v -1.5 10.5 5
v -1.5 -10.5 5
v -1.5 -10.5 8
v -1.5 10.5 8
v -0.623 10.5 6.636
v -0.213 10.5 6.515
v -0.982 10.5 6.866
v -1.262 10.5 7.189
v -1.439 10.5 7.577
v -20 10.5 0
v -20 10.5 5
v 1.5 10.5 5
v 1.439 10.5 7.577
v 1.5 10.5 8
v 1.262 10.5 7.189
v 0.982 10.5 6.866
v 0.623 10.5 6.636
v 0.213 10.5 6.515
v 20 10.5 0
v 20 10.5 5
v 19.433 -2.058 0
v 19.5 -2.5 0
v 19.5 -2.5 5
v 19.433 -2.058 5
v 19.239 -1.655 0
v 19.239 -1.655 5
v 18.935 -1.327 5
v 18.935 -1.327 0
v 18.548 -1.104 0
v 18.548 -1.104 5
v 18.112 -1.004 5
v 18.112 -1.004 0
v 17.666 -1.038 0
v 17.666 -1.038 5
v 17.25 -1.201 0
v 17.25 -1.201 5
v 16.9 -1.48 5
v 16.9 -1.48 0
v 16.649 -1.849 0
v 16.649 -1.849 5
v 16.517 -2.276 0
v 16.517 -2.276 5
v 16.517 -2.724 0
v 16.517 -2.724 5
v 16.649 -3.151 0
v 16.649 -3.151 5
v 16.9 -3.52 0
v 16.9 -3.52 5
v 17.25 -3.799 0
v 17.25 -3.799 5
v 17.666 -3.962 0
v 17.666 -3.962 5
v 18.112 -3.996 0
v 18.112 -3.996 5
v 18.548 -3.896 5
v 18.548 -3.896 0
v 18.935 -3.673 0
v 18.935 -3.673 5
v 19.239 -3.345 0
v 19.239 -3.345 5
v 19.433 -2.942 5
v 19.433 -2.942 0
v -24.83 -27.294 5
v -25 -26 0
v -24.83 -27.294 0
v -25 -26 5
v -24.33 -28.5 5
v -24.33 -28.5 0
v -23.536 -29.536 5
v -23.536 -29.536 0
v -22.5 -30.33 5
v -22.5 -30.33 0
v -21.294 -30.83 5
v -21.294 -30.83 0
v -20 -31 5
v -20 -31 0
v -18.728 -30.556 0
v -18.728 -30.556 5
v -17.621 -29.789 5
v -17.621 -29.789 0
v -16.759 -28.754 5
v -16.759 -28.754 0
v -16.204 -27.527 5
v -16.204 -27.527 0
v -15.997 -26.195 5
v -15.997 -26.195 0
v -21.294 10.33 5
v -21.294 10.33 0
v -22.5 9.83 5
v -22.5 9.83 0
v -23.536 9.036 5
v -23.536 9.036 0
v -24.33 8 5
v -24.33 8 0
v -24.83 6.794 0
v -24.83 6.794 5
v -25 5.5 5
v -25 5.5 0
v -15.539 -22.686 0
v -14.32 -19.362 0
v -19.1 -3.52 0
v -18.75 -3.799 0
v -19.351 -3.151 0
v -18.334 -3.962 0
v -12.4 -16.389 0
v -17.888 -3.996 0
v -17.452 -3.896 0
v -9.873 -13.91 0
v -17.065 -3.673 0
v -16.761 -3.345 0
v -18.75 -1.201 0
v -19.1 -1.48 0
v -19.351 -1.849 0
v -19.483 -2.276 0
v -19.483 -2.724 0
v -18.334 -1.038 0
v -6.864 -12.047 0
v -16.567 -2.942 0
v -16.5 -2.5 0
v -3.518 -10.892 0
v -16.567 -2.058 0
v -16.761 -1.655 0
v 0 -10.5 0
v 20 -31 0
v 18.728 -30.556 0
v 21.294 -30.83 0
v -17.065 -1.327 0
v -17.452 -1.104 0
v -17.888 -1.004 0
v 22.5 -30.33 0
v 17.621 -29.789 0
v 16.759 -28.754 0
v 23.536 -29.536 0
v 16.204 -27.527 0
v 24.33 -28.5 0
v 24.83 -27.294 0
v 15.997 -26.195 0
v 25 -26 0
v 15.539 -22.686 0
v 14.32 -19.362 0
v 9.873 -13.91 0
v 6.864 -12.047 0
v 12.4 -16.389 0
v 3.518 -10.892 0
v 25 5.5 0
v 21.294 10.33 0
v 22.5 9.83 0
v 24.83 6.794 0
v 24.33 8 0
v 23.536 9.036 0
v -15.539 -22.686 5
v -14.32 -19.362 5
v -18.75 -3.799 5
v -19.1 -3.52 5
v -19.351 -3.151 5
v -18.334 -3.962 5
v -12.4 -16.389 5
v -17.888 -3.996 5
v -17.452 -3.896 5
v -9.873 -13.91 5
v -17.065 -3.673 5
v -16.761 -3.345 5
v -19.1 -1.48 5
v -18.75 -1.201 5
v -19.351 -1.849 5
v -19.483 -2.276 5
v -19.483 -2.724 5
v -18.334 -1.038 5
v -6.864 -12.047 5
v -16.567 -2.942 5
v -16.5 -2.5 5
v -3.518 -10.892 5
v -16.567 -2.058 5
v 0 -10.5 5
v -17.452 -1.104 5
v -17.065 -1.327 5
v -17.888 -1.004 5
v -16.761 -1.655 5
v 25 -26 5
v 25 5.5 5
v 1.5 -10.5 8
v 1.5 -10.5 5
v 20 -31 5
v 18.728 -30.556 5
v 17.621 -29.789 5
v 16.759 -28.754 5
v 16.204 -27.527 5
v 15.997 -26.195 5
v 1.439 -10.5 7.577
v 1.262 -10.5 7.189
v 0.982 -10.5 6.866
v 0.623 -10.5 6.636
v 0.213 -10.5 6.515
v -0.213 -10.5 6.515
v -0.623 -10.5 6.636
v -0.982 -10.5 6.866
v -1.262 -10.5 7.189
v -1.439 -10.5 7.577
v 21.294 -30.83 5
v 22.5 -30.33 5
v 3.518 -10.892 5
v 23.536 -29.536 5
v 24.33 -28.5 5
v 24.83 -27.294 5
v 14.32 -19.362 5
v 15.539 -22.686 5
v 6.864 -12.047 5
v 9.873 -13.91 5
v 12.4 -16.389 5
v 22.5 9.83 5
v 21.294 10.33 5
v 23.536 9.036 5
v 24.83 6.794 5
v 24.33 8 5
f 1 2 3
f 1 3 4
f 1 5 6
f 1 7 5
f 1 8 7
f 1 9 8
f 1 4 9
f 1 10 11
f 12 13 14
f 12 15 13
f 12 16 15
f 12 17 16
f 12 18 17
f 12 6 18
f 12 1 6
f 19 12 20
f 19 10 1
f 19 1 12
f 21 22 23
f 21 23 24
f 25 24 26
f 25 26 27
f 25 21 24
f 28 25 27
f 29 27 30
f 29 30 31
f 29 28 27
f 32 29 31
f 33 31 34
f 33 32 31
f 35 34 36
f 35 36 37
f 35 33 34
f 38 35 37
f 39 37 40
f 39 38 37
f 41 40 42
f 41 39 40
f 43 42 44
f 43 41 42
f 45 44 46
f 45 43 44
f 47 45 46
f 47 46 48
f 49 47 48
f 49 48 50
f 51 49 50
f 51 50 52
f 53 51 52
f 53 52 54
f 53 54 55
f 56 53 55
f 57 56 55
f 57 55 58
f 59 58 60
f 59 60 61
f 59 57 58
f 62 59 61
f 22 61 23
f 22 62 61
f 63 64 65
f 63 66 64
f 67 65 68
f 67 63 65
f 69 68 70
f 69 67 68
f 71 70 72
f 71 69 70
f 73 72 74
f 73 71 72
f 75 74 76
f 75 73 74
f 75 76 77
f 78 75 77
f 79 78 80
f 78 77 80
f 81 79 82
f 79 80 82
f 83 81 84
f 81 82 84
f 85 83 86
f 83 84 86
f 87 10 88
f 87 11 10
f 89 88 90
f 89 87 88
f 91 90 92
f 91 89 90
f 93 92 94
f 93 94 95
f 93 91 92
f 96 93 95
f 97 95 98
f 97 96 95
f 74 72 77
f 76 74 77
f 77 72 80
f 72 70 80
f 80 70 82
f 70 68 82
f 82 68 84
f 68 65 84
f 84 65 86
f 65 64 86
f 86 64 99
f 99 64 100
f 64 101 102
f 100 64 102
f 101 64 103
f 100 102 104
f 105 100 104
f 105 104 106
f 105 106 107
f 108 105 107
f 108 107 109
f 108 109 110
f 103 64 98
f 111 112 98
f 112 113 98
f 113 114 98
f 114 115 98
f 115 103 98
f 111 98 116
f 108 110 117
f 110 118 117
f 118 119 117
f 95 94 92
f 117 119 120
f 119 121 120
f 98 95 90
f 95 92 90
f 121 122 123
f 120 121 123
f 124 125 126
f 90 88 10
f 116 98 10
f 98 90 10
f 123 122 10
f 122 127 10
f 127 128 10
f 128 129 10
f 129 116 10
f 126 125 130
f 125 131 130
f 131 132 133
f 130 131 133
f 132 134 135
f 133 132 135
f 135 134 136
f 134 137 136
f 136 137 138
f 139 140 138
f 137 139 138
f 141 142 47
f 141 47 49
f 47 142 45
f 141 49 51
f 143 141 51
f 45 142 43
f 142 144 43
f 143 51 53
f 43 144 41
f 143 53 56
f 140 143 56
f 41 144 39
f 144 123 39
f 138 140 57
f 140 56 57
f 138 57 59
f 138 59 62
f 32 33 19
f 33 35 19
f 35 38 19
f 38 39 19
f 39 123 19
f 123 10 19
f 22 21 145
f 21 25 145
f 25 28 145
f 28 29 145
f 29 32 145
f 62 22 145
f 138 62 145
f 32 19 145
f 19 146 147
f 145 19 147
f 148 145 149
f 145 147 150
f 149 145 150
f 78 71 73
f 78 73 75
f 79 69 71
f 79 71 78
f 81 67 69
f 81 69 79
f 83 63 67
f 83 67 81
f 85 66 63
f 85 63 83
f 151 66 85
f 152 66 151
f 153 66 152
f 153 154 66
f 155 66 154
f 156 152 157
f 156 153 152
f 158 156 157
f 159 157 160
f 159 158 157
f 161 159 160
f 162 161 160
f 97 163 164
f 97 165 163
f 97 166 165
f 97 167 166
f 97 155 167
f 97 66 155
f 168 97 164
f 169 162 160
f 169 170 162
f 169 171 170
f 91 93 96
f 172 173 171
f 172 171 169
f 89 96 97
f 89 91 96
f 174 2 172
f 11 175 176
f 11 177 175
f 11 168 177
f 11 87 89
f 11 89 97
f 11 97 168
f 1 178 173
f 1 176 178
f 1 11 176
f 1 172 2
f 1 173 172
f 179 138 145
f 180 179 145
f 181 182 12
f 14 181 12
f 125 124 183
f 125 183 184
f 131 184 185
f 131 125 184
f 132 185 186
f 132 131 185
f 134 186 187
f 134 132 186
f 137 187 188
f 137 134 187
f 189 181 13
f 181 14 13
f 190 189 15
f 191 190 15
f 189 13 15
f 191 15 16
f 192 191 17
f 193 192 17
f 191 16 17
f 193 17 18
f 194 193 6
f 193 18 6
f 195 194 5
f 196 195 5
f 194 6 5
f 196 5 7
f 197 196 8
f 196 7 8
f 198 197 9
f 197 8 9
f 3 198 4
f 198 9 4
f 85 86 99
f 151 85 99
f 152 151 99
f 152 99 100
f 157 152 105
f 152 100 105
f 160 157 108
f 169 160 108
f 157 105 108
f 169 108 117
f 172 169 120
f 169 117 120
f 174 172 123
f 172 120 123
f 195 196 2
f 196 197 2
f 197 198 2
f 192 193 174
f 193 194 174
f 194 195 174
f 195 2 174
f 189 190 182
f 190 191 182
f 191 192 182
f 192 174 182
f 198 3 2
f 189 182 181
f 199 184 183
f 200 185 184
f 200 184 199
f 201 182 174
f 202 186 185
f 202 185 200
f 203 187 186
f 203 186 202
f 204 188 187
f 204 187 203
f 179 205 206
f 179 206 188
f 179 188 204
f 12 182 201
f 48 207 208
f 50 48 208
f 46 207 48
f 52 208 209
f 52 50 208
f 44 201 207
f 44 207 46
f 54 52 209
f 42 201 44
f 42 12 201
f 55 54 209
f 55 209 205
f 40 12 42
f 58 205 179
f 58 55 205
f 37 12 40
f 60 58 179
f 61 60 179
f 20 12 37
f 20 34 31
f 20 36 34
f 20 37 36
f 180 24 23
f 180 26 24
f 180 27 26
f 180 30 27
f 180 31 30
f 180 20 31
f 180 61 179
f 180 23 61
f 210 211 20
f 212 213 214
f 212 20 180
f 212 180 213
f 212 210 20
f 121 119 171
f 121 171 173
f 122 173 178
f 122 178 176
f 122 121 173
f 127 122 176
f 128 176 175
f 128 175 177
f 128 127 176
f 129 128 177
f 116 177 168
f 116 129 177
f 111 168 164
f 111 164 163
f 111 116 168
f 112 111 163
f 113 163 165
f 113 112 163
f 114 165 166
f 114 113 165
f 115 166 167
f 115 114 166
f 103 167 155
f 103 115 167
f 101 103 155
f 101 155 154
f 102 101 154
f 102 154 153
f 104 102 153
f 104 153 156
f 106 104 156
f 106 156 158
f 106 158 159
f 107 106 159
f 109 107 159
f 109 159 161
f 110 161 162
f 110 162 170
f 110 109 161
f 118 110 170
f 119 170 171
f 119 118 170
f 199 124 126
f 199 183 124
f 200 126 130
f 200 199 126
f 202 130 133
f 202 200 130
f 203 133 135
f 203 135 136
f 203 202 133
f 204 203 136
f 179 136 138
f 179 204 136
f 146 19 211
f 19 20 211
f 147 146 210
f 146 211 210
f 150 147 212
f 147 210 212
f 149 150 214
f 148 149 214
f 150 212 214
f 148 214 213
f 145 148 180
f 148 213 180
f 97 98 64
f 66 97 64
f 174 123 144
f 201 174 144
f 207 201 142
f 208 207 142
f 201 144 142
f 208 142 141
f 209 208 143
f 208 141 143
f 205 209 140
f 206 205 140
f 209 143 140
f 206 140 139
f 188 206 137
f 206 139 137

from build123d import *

# Parameters (mm, degrees)
F0_R        = 1.5
F1_DEPTH    = 5
F2_R        = 5
F3_W        = 3
F3_H        = 21
F4_DEPTH    = 3
F5_R        = 1.5
F6_DEPTH    = 21
F7_T1_DEPTH = 29.0228793414


# Not quite as in the source:
# - a fillet or chamfer that OpenCascade refuses, or shapes differently, is made with other operations: its cross-section is extruded or revolved along the edge and cut away or added


with BuildPart() as f1:
    # F0 (on Top) → F1 (new body)
    with BuildSketch(Plane.XY):
        Polygon((0, -10.5), (25, -10.5), (25, 10.5), (-25, 10.5), (-25, -10.5), align=None)
        with Locations((-18, -2.5)):
            Circle(F0_R, mode=Mode.SUBTRACT)
        with Locations((18, -2.5)):
            Circle(F0_R, mode=Mode.SUBTRACT)
        with BuildLine():
            Line((25, -31), (25, -10.5))
            Line((25, -10.5), (0, -10.5))
            ThreePointArc((0, -10.5), (11.313708499, -15.186291501), (16, -26.5))
            Line((16, -26.5), (16, -31))
            Line((16, -31), (25, -31))
        make_face()
        with BuildLine():
            ThreePointArc((-16, -26.5), (-11.313708499, -15.186291501), (0, -10.5))
            Line((0, -10.5), (-25, -10.5))
            Line((-25, -10.5), (-25, -31))
            Line((-25, -31), (-16, -31))
            Line((-16, -31), (-16, -26.5))
        make_face()
    extrude(amount=F1_DEPTH)

    # F2
    f2_edges = [f1.edges().sort_by_distance(p)[0] for p in [
        (25, -31, 2.5),
        (-25, -31, 2.5),
        (-25, 10.5, 2.5),
        (25, 10.5, 2.5),
    ]]
    fillet(f2_edges, radius=F2_R)

    # F3 (on face) → F4 (join)
    with BuildSketch(Plane.XY.offset(5)):
        Rectangle(F3_W, F3_H)
    extrude(amount=F4_DEPTH)

    # F5 (on face) → F6 (cut, through all)
    with BuildSketch(Plane(origin=(0, 10.5, 0), x_dir=(-1, 0, 0), z_dir=(0, 1, 0))):
        with Locations((0, 8)):
            Circle(F5_R)
    extrude(amount=-F6_DEPTH, mode=Mode.SUBTRACT)

    # F7: fillet of radius 5 on 2 edges, made by hand

    # F7_s2 → F7_t1 (cut)
    with BuildSketch(Plane.XY.offset(-12.0114396707)):
        with BuildLine():
            ThreePointArc((20, -31), (17.1547293043, -29.3007363495), (15.9971008021, -26.1954250064))
            Line((15.9971008021, -26.1954250064), (15.4971914021, -26.204942975))
            ThreePointArc((15.4971914021, -26.204942975), (15.5, -26.5), (15.5, -31))
            Line((15.5, -31), (16, -31.5))
            ThreePointArc((16, -31.5), (18, -31.5), (19.9003805197, -31.4899754679))
            Line((19.9003805197, -31.4899754679), (20, -31))
        make_face()
        with BuildLine():
            ThreePointArc((-20, -31), (-17.1547293043, -29.3007363495), (-15.9971008021, -26.1954250064))
            Line((-15.9971008021, -26.1954250064), (-15.4971914021, -26.204942975))
            ThreePointArc((-15.4971914021, -26.204942975), (-15.5, -26.5), (-15.5, -31))
            Line((-15.5, -31), (-16, -31.5))
            ThreePointArc((-16, -31.5), (-18, -31.5), (-19.9003805197, -31.4899754679))
            Line((-19.9003805197, -31.4899754679), (-20, -31))
        make_face()
    extrude(amount=F7_T1_DEPTH, mode=Mode.SUBTRACT)


solid = f1.part
